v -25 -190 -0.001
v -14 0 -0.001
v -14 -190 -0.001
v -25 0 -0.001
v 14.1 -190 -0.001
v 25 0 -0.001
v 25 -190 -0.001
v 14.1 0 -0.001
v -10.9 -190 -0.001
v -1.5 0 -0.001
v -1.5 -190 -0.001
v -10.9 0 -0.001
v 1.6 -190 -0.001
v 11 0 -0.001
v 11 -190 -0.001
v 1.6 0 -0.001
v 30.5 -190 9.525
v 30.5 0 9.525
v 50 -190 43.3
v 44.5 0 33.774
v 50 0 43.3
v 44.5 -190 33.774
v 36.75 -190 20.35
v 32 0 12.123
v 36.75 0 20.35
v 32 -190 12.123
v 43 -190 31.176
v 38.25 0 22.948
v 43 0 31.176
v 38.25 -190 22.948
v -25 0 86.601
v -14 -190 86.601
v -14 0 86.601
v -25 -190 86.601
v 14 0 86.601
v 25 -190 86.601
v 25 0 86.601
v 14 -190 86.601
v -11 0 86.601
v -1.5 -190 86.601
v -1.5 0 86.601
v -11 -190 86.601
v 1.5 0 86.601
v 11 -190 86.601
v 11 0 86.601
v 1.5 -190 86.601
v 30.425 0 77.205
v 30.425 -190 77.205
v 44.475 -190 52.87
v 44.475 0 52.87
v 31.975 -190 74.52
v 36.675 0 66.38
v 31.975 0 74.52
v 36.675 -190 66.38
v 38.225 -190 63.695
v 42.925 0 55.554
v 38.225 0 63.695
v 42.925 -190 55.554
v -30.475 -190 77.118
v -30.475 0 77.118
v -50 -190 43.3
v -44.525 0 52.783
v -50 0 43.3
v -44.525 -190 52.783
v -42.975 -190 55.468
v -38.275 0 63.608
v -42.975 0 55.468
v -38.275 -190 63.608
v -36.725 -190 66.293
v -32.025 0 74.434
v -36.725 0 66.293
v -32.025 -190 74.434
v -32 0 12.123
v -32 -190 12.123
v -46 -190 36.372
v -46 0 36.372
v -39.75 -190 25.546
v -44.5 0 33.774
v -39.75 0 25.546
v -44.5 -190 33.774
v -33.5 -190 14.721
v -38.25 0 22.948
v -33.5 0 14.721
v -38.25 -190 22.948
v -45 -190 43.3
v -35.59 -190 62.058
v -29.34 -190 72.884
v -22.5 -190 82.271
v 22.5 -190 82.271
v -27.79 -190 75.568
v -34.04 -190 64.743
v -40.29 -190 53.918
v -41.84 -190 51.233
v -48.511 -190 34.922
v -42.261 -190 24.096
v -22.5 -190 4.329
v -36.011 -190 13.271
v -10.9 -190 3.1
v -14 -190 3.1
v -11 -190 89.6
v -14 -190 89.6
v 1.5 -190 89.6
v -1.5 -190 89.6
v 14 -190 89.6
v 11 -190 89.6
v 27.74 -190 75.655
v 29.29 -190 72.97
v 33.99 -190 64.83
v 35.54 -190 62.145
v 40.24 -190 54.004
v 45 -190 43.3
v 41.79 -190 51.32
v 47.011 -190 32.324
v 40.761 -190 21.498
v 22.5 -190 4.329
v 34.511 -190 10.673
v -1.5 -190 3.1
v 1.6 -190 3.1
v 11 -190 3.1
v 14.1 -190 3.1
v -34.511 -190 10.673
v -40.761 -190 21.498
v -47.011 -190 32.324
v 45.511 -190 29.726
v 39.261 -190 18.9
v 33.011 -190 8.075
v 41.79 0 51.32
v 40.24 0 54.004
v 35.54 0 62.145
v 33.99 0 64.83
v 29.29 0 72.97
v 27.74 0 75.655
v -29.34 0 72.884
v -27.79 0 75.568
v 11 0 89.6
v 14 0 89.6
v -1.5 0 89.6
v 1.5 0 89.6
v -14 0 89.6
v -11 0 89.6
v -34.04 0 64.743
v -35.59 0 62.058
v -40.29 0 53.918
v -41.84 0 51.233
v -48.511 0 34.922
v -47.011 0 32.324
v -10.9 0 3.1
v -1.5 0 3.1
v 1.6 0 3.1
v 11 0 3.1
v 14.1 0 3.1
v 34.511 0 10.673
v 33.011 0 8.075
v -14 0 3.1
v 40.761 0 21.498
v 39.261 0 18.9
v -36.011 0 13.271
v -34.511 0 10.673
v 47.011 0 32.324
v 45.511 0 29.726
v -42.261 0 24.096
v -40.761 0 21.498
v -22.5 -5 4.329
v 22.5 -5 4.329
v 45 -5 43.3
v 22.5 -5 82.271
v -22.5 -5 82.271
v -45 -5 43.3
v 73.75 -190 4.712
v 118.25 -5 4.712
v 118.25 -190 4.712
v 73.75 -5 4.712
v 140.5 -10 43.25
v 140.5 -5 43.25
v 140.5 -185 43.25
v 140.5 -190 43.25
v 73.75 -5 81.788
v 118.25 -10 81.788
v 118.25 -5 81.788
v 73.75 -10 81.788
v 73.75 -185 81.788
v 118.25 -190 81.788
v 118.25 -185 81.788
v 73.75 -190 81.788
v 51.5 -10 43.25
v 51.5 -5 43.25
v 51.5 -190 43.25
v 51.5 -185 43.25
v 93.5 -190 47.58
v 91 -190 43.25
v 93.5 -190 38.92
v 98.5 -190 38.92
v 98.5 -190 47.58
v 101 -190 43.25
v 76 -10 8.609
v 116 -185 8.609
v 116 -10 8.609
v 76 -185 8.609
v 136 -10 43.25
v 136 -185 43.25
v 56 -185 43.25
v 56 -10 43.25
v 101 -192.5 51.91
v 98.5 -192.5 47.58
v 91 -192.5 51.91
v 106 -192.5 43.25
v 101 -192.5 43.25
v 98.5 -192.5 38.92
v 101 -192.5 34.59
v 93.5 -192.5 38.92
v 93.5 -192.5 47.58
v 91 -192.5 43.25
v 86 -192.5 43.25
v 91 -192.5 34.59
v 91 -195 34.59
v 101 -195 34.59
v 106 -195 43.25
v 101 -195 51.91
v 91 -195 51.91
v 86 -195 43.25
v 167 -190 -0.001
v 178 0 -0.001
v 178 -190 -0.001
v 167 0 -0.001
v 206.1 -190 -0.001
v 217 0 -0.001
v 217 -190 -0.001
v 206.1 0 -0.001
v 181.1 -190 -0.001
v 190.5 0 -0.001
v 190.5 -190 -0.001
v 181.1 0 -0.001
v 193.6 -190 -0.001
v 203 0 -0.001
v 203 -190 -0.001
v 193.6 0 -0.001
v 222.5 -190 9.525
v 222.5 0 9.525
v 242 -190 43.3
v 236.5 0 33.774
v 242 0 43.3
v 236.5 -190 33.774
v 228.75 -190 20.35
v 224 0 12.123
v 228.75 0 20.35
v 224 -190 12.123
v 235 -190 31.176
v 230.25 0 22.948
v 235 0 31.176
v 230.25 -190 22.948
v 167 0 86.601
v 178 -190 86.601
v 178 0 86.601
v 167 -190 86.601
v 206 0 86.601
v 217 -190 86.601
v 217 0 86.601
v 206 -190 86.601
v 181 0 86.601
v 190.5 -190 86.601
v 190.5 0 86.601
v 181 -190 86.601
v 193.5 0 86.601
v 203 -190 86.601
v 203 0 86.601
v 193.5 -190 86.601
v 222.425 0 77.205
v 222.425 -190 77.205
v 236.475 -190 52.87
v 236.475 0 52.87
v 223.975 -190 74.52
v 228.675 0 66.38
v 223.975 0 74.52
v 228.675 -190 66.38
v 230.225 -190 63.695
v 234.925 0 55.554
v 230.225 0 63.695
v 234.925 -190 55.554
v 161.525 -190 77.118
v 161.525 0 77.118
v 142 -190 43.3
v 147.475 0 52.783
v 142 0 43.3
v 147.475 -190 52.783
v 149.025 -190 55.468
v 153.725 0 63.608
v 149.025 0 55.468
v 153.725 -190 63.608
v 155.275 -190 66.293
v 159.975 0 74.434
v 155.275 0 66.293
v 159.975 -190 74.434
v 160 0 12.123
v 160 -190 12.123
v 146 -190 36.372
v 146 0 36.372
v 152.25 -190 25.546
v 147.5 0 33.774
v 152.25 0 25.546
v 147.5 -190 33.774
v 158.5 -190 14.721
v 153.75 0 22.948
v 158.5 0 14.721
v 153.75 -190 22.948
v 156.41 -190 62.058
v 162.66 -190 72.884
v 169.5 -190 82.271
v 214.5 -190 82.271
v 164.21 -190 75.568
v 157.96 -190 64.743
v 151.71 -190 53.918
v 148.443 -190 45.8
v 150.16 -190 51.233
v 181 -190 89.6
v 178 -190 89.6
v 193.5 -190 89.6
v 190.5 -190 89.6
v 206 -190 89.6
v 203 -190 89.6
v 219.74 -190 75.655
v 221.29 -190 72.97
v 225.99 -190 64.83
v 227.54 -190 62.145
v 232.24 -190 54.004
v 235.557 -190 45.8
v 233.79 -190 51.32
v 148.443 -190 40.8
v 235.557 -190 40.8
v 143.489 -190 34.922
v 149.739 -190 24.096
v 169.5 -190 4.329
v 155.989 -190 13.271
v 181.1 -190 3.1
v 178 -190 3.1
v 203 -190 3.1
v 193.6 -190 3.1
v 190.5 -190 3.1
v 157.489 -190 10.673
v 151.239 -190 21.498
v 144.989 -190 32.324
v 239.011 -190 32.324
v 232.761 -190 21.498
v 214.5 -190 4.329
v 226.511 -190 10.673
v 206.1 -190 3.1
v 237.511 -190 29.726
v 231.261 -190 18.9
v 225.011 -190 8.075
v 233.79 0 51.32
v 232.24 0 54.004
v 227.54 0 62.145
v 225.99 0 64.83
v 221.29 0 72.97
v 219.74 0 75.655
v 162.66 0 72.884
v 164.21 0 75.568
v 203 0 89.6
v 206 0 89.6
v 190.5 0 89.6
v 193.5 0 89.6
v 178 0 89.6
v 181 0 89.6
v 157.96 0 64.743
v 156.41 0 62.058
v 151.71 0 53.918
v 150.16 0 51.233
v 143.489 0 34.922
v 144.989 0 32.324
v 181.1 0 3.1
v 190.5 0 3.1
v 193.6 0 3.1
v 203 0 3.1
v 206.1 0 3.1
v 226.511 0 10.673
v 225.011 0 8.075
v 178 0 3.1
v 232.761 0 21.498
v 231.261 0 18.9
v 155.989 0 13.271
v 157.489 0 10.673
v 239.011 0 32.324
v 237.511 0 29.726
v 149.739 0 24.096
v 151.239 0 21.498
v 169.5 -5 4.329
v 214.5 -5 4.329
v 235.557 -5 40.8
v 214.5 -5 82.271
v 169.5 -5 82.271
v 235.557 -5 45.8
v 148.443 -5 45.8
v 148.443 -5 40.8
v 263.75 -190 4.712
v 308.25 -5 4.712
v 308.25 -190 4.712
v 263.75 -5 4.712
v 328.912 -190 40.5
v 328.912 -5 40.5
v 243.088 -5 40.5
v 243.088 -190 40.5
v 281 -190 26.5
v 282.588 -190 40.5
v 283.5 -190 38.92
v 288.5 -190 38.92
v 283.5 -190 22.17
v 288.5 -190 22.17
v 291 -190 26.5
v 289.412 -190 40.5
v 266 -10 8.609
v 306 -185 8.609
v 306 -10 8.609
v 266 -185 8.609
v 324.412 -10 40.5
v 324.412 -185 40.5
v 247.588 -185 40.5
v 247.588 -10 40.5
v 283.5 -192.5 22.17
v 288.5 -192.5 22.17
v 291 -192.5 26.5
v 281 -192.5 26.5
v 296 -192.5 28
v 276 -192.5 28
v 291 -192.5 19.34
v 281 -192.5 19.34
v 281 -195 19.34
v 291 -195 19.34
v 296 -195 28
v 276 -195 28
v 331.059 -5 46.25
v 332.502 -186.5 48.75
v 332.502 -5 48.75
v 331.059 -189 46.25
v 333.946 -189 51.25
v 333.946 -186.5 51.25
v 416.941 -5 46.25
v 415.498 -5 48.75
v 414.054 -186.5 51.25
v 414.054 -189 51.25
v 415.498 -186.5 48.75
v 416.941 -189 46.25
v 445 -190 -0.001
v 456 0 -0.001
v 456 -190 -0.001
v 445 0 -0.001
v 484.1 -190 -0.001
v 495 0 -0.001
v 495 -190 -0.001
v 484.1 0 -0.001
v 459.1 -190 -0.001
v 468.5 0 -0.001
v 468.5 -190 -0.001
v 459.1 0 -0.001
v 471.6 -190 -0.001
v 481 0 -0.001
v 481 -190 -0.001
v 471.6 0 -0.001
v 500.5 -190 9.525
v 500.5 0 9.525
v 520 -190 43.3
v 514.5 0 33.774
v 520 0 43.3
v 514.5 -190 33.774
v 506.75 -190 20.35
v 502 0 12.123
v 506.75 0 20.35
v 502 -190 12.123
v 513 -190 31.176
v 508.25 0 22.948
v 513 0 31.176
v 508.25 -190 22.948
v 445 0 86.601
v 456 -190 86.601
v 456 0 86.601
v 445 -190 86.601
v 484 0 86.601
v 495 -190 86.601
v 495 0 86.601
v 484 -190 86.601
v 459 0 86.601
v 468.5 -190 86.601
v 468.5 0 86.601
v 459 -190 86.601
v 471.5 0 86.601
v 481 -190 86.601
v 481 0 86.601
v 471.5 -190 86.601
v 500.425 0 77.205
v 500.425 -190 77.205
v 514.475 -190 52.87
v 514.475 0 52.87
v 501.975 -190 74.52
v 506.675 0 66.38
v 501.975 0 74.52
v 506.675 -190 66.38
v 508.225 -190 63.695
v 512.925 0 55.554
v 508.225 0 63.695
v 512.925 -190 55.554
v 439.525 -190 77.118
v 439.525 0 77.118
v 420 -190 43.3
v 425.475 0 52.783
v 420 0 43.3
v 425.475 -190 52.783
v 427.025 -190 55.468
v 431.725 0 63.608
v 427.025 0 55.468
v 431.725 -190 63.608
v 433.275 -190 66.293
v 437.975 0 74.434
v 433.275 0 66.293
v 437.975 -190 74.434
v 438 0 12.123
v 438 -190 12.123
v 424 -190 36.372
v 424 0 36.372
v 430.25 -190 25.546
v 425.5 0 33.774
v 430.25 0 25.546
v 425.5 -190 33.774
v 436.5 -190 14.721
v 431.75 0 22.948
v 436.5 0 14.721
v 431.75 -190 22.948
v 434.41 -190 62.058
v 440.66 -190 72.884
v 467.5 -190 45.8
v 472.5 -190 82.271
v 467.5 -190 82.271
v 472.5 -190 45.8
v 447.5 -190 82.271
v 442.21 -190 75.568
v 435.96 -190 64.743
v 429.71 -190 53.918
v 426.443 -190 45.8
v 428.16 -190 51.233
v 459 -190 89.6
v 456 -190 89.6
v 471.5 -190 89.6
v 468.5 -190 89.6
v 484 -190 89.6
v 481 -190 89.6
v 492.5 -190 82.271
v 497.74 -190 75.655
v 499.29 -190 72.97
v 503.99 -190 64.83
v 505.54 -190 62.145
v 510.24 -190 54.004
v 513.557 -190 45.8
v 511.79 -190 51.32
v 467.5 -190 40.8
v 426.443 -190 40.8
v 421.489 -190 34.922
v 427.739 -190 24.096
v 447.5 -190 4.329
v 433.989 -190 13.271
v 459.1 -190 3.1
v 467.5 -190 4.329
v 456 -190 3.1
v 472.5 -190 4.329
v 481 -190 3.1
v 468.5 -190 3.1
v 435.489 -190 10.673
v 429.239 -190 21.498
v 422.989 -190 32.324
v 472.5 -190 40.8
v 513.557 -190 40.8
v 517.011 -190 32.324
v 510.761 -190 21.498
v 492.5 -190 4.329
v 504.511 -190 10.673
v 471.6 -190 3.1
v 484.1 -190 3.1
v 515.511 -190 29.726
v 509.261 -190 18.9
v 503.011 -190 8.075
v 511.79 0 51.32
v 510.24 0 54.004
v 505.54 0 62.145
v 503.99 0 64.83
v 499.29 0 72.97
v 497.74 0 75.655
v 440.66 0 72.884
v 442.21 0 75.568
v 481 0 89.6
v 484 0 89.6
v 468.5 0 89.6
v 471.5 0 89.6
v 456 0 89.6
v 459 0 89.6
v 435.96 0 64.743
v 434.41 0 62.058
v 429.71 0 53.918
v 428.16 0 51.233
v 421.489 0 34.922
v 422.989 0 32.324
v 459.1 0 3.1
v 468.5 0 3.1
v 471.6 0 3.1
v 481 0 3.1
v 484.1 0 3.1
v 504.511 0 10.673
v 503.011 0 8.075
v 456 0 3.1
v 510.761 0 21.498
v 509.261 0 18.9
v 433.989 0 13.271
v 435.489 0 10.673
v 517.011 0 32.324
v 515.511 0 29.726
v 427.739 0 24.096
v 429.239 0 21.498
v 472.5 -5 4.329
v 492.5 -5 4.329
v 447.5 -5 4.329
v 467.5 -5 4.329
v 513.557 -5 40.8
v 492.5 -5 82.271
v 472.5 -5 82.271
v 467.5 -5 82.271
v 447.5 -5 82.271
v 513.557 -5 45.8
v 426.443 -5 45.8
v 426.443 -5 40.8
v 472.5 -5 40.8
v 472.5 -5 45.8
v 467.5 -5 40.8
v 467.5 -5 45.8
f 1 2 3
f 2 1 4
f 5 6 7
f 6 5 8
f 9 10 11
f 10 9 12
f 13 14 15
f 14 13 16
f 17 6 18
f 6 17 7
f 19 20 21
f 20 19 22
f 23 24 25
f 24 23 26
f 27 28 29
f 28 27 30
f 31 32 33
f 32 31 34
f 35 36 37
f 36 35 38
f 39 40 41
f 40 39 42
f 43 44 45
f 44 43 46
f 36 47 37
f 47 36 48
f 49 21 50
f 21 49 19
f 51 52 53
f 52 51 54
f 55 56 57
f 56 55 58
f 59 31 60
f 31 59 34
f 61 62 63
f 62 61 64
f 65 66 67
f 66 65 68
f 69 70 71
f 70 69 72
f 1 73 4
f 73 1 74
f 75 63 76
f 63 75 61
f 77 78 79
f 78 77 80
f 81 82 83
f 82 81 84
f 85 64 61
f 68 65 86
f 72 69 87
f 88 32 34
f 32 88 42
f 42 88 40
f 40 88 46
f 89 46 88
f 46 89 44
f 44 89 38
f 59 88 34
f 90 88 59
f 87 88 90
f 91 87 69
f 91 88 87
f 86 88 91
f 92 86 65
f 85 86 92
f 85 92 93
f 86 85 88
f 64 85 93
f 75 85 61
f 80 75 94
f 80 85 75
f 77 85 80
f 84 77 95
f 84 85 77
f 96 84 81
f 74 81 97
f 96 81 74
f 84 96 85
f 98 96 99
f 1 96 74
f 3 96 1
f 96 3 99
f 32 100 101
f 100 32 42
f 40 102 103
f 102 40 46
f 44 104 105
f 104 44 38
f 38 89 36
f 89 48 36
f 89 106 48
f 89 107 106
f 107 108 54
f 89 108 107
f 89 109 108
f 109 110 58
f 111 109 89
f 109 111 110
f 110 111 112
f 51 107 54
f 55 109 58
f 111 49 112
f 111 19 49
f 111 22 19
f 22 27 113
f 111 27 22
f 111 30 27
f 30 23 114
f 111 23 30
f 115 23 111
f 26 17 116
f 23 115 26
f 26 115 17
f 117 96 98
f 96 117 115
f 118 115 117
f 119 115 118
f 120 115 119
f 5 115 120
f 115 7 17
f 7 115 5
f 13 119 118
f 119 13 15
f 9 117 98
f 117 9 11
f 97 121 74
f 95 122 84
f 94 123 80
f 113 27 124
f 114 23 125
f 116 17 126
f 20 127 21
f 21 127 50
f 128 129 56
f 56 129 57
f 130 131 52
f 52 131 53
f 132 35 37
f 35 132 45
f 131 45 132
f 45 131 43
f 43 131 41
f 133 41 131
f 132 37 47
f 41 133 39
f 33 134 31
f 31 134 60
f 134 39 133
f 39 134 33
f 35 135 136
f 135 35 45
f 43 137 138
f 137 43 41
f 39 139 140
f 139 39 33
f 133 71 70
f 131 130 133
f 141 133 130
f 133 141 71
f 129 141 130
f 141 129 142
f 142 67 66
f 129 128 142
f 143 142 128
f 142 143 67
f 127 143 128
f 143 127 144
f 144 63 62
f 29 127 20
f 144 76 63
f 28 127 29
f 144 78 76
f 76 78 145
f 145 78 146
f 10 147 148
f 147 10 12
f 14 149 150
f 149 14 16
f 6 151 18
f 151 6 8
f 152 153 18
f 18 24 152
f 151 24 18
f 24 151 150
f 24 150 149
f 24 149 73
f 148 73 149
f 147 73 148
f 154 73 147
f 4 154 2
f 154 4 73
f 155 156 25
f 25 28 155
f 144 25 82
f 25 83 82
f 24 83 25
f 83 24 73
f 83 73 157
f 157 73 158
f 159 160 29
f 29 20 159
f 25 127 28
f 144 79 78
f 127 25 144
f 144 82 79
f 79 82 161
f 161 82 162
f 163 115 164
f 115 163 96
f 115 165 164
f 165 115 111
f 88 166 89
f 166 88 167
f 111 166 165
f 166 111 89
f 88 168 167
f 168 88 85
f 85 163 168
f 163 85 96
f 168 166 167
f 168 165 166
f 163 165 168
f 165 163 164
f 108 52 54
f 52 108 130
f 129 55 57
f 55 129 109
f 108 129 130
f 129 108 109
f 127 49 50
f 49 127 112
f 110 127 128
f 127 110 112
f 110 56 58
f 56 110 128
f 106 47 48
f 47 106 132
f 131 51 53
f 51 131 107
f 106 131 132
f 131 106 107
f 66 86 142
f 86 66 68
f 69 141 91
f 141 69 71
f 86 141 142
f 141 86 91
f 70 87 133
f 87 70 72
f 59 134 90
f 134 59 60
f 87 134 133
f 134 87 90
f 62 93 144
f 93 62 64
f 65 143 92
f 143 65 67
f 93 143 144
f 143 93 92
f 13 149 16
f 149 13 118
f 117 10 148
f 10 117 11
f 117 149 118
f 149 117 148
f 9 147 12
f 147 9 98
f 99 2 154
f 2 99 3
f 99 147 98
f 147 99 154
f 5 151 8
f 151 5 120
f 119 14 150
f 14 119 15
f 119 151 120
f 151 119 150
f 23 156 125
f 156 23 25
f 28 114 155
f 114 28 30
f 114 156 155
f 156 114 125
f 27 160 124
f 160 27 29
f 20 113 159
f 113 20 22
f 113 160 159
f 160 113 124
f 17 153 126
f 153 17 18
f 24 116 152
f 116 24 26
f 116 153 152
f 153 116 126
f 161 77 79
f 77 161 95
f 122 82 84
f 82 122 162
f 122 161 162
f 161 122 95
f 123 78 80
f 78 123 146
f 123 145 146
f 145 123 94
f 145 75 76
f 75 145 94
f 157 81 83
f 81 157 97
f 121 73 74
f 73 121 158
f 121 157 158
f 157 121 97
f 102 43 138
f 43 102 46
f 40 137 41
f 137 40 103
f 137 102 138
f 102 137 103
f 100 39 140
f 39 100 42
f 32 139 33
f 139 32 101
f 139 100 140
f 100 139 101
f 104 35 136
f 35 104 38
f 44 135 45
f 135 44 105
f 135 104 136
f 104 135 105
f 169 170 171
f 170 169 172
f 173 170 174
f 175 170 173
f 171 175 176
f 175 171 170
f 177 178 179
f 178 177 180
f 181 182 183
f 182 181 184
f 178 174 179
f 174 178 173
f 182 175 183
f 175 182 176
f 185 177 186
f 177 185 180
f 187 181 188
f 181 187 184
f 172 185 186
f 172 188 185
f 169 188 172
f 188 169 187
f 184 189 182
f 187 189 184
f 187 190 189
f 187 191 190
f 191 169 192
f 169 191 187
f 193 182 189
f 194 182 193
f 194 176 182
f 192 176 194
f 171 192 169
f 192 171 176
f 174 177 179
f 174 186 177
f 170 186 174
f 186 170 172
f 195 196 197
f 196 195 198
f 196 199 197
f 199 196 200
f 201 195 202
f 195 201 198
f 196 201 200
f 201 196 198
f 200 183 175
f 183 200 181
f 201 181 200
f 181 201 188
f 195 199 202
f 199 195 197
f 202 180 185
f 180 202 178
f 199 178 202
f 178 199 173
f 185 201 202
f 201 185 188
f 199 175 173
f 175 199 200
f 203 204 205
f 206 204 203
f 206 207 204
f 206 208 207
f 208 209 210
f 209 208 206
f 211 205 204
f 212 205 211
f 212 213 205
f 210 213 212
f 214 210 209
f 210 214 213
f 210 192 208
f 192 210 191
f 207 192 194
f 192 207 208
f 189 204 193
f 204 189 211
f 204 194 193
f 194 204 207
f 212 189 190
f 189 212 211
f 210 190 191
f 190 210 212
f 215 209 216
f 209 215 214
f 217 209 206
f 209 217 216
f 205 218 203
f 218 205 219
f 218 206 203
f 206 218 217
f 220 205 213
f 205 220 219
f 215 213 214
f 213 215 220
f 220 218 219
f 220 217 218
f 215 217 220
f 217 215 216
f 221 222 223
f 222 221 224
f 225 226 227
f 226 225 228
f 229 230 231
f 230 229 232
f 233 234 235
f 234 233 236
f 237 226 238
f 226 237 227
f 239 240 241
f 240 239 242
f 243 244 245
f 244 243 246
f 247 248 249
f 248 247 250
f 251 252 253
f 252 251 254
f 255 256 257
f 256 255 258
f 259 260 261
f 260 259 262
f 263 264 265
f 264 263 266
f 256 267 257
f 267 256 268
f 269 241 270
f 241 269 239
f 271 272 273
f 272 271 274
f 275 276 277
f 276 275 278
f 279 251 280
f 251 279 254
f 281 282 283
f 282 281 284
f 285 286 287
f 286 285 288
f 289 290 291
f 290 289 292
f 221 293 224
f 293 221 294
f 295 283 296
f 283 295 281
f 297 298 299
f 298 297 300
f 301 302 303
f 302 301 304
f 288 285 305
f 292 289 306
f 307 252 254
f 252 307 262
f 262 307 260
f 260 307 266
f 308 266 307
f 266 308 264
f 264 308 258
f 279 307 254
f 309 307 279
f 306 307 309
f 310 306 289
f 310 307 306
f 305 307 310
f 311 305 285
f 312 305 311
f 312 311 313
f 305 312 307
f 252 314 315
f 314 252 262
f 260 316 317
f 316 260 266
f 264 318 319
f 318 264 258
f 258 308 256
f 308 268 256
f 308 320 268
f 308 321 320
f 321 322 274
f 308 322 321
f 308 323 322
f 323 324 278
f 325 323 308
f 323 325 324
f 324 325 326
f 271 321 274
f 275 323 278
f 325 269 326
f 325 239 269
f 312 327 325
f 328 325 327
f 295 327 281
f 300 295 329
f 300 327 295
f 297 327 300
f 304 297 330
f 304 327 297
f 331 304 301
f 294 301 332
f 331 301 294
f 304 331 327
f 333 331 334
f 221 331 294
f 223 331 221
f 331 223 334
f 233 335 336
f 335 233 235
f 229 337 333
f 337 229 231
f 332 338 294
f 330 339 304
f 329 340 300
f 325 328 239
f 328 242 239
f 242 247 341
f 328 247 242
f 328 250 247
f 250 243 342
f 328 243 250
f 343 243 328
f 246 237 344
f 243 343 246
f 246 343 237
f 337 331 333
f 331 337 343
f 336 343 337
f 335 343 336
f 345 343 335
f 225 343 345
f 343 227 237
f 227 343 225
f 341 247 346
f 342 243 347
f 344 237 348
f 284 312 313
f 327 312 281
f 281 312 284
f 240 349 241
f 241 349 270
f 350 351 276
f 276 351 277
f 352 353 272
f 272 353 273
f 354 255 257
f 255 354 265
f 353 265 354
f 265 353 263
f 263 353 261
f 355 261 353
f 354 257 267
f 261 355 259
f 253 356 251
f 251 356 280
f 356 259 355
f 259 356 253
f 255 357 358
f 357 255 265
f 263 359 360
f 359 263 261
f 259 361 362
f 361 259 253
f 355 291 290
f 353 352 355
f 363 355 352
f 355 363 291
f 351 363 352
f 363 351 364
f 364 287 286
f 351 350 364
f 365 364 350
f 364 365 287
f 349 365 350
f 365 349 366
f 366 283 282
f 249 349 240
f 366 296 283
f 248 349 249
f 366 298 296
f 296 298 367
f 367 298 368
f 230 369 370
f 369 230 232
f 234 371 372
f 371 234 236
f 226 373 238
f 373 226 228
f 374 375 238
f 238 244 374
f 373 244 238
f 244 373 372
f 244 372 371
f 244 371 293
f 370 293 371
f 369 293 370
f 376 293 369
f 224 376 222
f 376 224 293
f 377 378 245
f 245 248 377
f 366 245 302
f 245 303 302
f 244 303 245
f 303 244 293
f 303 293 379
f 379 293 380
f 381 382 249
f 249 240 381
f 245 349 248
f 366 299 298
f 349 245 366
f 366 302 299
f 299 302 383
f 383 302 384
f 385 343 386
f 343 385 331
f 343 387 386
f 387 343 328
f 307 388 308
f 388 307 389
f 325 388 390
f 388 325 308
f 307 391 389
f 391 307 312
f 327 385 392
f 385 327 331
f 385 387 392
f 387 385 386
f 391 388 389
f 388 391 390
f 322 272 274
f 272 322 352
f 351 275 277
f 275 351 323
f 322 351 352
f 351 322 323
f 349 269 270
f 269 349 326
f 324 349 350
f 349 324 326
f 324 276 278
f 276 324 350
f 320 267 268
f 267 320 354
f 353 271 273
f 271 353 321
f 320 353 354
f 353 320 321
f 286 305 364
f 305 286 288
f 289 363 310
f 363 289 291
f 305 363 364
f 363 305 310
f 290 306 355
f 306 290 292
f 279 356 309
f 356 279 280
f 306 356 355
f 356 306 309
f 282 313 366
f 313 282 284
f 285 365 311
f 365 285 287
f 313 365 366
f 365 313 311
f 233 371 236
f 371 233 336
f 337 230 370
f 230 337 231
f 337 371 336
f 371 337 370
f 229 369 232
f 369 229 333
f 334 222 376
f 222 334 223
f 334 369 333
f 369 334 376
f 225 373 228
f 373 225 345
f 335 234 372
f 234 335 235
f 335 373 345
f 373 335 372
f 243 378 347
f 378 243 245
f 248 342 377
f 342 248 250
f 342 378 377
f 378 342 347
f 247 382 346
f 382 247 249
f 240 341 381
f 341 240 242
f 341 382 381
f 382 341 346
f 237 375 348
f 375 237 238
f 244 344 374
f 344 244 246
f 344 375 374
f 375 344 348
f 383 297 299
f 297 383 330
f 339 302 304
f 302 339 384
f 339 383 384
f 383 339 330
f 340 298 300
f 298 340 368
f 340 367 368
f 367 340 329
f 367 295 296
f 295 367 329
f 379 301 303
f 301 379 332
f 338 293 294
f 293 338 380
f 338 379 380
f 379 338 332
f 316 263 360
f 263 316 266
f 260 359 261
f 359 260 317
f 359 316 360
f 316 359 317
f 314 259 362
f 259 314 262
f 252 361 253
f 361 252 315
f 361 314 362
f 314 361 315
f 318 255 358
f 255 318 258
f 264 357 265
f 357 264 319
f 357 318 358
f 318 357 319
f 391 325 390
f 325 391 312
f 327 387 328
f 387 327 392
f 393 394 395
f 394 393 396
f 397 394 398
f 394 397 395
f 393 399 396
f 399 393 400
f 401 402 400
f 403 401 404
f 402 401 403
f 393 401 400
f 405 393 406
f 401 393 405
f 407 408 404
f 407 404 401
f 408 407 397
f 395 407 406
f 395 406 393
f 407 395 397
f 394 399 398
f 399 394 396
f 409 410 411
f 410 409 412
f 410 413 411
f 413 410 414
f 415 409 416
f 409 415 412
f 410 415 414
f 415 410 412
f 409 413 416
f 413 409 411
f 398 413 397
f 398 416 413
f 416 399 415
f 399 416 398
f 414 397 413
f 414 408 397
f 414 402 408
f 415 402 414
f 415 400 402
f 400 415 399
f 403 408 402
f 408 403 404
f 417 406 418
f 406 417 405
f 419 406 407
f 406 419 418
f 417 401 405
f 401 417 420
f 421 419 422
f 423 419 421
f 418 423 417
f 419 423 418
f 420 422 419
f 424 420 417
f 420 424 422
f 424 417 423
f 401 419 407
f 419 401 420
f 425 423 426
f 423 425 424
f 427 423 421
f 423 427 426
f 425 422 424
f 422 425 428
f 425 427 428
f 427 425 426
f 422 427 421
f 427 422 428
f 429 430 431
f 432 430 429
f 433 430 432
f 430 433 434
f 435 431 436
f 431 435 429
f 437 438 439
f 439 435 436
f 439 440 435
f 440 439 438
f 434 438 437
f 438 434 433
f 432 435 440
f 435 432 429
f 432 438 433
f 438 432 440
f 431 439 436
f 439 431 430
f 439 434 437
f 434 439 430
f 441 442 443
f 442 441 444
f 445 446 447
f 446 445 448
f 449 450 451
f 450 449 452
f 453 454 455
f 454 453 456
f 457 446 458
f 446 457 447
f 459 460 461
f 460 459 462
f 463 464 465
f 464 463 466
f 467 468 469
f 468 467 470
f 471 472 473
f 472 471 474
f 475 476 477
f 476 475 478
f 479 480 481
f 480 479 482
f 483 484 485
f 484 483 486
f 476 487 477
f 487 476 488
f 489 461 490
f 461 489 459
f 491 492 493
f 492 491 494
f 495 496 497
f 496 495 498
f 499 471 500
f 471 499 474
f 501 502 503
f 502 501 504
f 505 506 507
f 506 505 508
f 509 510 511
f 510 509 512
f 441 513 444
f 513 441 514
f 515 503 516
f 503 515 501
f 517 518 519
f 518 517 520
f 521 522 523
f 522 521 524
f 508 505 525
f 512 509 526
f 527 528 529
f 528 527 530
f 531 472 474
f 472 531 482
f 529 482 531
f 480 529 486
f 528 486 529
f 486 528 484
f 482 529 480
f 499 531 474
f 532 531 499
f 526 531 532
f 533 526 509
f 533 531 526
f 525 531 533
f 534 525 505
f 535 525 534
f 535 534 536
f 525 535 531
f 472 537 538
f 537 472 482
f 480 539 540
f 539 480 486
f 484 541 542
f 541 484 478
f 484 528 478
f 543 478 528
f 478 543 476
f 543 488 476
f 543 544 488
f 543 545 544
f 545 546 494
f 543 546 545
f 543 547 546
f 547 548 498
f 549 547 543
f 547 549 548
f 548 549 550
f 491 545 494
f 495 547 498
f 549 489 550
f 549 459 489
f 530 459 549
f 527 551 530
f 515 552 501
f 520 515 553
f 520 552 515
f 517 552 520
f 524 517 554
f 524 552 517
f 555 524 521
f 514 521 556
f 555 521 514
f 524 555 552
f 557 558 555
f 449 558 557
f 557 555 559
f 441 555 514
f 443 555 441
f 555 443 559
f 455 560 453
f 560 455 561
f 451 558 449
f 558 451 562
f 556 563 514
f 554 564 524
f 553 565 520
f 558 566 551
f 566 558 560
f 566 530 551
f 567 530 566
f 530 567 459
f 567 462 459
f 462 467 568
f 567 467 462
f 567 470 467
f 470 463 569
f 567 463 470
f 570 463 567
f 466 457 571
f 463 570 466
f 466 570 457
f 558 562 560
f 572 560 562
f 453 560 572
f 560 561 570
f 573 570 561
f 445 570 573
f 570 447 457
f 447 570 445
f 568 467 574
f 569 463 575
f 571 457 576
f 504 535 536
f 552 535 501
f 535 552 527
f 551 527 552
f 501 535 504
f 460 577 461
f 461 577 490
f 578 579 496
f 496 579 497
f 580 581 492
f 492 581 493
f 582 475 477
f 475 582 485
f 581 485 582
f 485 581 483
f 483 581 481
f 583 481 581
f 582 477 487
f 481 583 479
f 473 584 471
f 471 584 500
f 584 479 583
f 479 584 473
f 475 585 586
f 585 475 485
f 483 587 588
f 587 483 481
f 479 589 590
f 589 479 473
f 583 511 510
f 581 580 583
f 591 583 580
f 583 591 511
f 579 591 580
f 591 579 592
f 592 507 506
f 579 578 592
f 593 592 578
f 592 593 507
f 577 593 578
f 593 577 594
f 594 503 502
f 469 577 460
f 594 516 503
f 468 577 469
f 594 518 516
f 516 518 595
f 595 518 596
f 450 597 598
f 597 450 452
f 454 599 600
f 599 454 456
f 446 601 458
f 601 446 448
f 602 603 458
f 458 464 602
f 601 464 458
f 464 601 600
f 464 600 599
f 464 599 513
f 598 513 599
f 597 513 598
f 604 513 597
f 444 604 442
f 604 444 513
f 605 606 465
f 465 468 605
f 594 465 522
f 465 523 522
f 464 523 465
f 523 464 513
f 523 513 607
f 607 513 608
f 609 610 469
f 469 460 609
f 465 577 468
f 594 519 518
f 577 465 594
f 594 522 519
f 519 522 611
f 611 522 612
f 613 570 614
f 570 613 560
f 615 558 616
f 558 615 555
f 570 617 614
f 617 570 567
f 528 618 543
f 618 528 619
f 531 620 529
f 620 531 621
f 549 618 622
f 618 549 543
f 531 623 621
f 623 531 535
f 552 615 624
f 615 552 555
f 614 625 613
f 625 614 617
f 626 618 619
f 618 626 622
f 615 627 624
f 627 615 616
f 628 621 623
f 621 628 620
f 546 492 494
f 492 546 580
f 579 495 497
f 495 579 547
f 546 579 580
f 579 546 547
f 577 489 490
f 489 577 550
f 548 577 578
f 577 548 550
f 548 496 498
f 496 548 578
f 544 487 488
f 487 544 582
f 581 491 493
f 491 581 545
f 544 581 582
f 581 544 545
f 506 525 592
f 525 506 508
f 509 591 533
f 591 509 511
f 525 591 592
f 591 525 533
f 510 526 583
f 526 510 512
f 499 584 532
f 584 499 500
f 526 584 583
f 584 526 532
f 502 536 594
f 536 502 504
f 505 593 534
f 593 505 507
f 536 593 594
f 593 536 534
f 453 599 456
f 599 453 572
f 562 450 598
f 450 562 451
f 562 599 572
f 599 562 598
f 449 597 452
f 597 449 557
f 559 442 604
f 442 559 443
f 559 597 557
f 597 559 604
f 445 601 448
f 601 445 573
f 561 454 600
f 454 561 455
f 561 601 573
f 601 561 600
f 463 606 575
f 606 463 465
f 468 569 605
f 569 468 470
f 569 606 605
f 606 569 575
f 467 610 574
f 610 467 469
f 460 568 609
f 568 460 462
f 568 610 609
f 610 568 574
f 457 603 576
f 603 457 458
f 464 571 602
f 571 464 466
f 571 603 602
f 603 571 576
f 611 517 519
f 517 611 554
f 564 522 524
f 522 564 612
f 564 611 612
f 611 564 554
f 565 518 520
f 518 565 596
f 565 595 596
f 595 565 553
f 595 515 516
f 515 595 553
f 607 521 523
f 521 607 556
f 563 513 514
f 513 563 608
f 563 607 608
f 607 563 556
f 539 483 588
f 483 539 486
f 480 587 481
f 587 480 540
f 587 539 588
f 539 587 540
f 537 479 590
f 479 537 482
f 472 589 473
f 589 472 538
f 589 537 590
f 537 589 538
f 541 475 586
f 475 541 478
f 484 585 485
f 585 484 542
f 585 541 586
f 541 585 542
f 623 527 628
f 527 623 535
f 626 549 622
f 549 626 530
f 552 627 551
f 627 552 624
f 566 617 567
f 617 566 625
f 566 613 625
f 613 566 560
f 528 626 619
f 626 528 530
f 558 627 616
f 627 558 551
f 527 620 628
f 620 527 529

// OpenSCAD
//Honeycomb style interlocking shelves
// v0.1
//By Braden Bishop
module shell() {
    translate([0,0,43.3]) {
        rotate([90,0,0]) {
            difference() {
                cylinder(h=190,r=50,$fa=60);
                translate([0,0,5]) cylinder(h=200,r=            45,$fa=60);
                translate([50,0,0]) {
                rotate([0,0,120]) translate([23.55,-.1,-.5]) cube([3.1,3.2,191]);
            }
            translate([50,0,0]) {
                rotate([0,0,120]) translate([11.05,-.1,-.5]) cube([3.1,3.2,191]);
            }
            translate([50,0,0]) {
                rotate([0,0,120]) translate([36.05,-.1,-.5]) cube([3.1,3.2,191]);
            }
            translate([-50,0,0]) {
                rotate([0,0,240]) translate([-26.55,-.1,-.5]) cube([3.1,3.2,191]);
            }
            translate([-50,0,0]) {
                rotate([0,0,240]) translate([-39.05,-.1,-.5]) cube([3.1,3.2,191]);
            }
            translate([-50,0,0]) {
                rotate([0,0,240]) translate([-14.05,-.1,-.5]) cube([3.1,3.2,191]);
            }
            translate([-1.5,-43.4,-.5]) cube([3.1,3.2,191]);
            translate([-14,-43.4,-.5]) cube([3.1,3.2,191]);
            translate([11,-43.4,-.5]) cube([3.1,3.2,191]);
            }
            translate([50,0,0]) {
                rotate([0,0,240]) translate([23.5,-.1,0]) cube([3,3,190]);
            }
            translate([50,0,0]) {
                rotate([0,0,240]) translate([11,-.1,0]) cube([3,3,190]);
            }
            translate([50,0,0]) {
                rotate([0,0,240]) translate([36,-.1,0]) cube([3,3,190]);
            }
            translate([-50,0,0]) {
                rotate([0,0,120]) translate([-23.5,-.1,0]) cube([3,3,190]);
            }
            translate([-50,0,0]) {
                rotate([0,0,120]) translate([-11,-.1,0]) cube([3,3,190]);
            }
            translate([-50,0,0]) {
                rotate([0,0,120]) translate([-36,-.1,0]) cube([3,3,190]);
            }
            translate([-1.5,43.3,0]) cube([3,3,190]);
            translate([-14,43.3,0]) cube([3,3,190]);
            translate([11,43.3,0]) cube([3,3,190]);
        }
    }
}
module twoShelf() {
    shell();
    translate([-45,-190,40.8]) cube([90,190,5]);
}
module fourShelf() {
    shell();
    translate([-45,-190,40.8]) cube([90,190,5]);
    translate([-2.5,-190,4]) cube([5,190,80]);
}
module drawer() {
    translate([0,-5,43.25]) {
        rotate([90,0,0]) {
            difference() {
                cylinder(r=44.5,h=185,$fa=60);
                translate([0,0,5]) cylinder(r=40,h=175,$fa=60);
                translate([-50,0,5]) cube([100,50,175]);
            }
            translate([0,0,182.5]) {
                difference() {
                    cylinder(r=10,h=7.5,$fa=60);
                    difference() {
                        cylinder(r=10.1,h=5,$fa=60);
                        cylinder(r=5,h=5,$fa=60);
                    }
                }
            }
        }
    }
}
module halfDrawer() {
    difference() {
        drawer();
        translate([-50,-191,40.5]) cube([100,192,50]);
        translate([-15,-201,30]) cube([25,10.9999,25]);
    }
    translate([0,-187.5,28]) {
        rotate([90,0,0]) {
            difference() {
                cylinder(r=10,h=7.5,$fa=60);
                translate([-12.5,0,0]) cube([25,25,25]);
                difference() {
                    cylinder(r=10.1,h=5,$fa=60);
                    translate([0,-1.5,0]) {
                        difference() {
                            cylinder(r=5,h=5,$fa=60);
                            translate([-5,0,0]) cube([10,5,10]);
                        }
                    }
                }
            }
        }
    }
}
module pulloutShelf() {
    translate([-45,-189,46.25]) {
        difference() {
            cube([90,184,5]);
            translate([45.5,189,-46]) twoShelf();
            translate([44.5,189,-46]) twoShelf();
            translate([0,2.5,2.5]) cube([90,184,5]);
        }
    }
}
shell();
translate([96,0,0]) drawer();
translate([192,0,0]) twoShelf();
translate([286,0,0]) halfDrawer();
translate([374,0,0]) pulloutShelf();
translate([470,0,0]) fourShelf();
